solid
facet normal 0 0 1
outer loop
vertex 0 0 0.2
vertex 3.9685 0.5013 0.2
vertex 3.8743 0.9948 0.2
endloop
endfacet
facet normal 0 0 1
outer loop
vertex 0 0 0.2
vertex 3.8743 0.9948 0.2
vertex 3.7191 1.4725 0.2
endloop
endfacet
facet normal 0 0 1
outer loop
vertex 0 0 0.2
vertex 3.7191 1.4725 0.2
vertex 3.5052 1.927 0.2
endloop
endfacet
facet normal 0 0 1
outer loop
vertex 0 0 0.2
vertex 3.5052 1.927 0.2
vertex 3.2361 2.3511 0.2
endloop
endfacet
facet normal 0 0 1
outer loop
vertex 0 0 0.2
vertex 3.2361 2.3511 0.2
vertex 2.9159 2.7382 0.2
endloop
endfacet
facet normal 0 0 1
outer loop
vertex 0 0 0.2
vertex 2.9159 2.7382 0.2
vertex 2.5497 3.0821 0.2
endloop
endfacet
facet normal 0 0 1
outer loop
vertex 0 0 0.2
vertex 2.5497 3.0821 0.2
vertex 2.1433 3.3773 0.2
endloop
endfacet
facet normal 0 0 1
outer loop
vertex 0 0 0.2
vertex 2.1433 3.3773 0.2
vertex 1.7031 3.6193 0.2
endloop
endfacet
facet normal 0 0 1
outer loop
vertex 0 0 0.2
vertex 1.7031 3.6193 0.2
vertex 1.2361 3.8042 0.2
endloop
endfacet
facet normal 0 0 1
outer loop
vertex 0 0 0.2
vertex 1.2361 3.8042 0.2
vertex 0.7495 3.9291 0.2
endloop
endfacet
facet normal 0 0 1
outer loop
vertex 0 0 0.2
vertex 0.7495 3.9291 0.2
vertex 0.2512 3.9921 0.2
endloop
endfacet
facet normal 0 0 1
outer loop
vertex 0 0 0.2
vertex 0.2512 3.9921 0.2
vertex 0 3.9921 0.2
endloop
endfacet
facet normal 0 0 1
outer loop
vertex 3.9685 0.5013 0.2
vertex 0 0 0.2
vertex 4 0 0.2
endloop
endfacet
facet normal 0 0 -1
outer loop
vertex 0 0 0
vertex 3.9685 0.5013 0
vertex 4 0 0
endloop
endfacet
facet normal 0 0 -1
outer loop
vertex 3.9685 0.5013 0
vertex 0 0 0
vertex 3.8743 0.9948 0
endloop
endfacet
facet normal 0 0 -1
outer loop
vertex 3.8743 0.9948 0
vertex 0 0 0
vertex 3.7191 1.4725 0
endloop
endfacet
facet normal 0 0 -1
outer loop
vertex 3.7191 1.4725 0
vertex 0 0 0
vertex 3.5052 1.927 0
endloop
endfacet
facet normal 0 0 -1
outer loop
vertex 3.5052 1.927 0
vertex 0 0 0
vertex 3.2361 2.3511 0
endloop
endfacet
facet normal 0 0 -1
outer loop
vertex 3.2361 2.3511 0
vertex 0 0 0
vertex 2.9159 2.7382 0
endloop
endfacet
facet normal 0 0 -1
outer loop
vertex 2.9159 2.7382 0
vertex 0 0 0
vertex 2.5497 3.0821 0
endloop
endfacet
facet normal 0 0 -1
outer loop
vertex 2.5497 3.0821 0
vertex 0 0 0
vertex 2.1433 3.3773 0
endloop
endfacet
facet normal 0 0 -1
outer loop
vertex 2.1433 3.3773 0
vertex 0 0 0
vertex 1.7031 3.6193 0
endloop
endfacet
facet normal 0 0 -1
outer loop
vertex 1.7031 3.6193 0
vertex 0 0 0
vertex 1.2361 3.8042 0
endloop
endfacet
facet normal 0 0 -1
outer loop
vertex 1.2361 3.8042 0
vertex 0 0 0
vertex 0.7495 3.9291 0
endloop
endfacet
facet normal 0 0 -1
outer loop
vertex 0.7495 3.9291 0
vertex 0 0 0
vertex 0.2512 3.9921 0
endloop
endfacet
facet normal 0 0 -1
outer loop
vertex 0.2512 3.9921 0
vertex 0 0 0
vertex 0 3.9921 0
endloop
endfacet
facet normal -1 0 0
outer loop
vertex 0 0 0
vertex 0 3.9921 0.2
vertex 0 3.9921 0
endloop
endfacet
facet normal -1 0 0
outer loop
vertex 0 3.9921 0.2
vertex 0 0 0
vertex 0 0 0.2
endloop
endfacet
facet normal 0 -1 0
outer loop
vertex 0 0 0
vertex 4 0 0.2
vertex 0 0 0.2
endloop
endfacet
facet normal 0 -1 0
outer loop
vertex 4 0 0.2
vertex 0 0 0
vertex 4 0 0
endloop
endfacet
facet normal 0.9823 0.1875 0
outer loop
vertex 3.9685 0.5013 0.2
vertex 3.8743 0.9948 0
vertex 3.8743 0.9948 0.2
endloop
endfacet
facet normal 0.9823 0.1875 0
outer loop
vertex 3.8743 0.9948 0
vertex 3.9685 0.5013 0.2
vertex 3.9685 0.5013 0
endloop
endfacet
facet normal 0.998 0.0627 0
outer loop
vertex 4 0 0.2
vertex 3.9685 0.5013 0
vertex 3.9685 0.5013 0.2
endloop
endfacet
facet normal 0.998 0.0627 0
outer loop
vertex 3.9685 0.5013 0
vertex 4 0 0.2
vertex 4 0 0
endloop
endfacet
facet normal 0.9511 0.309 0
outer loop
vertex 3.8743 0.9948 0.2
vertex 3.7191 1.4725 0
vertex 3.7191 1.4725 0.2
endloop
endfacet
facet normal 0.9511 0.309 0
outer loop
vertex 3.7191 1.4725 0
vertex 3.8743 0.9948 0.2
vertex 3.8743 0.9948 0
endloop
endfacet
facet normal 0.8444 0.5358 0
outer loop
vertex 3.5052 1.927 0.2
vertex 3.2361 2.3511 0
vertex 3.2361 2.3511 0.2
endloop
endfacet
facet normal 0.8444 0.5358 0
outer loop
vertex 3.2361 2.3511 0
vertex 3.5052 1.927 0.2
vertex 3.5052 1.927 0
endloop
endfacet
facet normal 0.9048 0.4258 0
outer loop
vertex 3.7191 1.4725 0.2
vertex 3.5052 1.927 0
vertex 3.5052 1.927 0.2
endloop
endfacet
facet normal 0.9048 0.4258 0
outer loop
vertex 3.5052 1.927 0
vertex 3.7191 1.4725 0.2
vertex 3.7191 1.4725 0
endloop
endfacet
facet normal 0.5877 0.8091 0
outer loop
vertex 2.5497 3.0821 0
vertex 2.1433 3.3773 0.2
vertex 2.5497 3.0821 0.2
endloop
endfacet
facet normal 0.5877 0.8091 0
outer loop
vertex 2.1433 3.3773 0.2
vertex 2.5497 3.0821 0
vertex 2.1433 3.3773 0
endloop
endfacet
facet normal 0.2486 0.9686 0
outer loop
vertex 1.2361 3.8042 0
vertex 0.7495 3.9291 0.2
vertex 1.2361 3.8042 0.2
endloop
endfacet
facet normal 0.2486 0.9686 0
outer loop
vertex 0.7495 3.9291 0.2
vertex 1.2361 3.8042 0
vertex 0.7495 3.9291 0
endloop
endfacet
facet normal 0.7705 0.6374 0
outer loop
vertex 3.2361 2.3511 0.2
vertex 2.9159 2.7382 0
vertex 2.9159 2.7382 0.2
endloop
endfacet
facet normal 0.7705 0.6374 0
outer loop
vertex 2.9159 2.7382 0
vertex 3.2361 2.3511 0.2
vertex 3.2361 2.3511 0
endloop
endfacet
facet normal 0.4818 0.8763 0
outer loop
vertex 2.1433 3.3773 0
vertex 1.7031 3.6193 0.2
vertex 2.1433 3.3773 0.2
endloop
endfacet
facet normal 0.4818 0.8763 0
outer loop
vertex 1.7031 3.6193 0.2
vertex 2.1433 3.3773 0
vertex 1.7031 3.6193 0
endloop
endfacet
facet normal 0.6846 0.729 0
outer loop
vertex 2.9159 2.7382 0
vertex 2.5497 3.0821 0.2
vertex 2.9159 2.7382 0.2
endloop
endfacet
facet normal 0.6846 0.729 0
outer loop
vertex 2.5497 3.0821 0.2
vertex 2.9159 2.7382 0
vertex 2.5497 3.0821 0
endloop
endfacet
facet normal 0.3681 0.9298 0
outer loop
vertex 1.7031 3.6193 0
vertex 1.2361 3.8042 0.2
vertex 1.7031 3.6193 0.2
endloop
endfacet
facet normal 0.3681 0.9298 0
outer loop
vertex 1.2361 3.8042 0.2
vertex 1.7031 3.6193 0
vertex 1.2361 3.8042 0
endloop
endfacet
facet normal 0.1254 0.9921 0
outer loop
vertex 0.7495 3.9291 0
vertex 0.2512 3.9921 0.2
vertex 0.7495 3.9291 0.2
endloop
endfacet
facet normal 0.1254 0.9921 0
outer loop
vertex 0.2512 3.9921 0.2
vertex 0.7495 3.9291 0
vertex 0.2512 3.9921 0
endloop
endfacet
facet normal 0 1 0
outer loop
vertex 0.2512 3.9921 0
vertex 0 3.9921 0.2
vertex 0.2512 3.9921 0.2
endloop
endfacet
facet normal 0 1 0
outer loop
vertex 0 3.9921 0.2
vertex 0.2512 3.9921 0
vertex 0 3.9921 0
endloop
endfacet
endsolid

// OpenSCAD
module Street_06(){

    intersection(){
        translate([0,0,0]){
        color("#3b4747")
        cube([8,8,0.2]);
        }

        translate([0,0,0])
        cylinder(4,4,4, $fn=50);
    }
}

Street_06();

// Written by Nicolì Angelo (Gengio) 2024: 
// MIT License

//Permission is hereby granted, free of charge, to any person obtaining a copy of this software and associated documentation files (the "Software"), to deal in the Software without restriction, including without limitation the rights to use, copy, modify, merge, publish, distribute, sublicense, and/or sell copies of the Software, and to permit persons to whom the Software is furnished to do so, subject to the following conditions:

//The above copyright notice and this permission notice shall be included in all copies or substantial portions of the Software.

//THE SOFTWARE IS PROVIDED "AS IS", WITHOUT WARRANTY OF ANY KIND, EXPRESS OR IMPLIED, INCLUDING BUT NOT LIMITED TO THE WARRANTIES OF MERCHANTABILITY, FITNESS FOR A PARTICULAR PURPOSE AND NONINFRINGEMENT. IN NO EVENT SHALL THE AUTHORS OR COPYRIGHT HOLDERS BE LIABLE FOR ANY CLAIM, DAMAGES OR OTHER LIABILITY, WHETHER IN AN ACTION OF CONTRACT, TORT OR OTHERWISE, ARISING FROM, OUT OF OR IN CONNECTION WITH THE SOFTWARE OR THE USE OR OTHER DEALINGS IN THE SOFTWARE.
